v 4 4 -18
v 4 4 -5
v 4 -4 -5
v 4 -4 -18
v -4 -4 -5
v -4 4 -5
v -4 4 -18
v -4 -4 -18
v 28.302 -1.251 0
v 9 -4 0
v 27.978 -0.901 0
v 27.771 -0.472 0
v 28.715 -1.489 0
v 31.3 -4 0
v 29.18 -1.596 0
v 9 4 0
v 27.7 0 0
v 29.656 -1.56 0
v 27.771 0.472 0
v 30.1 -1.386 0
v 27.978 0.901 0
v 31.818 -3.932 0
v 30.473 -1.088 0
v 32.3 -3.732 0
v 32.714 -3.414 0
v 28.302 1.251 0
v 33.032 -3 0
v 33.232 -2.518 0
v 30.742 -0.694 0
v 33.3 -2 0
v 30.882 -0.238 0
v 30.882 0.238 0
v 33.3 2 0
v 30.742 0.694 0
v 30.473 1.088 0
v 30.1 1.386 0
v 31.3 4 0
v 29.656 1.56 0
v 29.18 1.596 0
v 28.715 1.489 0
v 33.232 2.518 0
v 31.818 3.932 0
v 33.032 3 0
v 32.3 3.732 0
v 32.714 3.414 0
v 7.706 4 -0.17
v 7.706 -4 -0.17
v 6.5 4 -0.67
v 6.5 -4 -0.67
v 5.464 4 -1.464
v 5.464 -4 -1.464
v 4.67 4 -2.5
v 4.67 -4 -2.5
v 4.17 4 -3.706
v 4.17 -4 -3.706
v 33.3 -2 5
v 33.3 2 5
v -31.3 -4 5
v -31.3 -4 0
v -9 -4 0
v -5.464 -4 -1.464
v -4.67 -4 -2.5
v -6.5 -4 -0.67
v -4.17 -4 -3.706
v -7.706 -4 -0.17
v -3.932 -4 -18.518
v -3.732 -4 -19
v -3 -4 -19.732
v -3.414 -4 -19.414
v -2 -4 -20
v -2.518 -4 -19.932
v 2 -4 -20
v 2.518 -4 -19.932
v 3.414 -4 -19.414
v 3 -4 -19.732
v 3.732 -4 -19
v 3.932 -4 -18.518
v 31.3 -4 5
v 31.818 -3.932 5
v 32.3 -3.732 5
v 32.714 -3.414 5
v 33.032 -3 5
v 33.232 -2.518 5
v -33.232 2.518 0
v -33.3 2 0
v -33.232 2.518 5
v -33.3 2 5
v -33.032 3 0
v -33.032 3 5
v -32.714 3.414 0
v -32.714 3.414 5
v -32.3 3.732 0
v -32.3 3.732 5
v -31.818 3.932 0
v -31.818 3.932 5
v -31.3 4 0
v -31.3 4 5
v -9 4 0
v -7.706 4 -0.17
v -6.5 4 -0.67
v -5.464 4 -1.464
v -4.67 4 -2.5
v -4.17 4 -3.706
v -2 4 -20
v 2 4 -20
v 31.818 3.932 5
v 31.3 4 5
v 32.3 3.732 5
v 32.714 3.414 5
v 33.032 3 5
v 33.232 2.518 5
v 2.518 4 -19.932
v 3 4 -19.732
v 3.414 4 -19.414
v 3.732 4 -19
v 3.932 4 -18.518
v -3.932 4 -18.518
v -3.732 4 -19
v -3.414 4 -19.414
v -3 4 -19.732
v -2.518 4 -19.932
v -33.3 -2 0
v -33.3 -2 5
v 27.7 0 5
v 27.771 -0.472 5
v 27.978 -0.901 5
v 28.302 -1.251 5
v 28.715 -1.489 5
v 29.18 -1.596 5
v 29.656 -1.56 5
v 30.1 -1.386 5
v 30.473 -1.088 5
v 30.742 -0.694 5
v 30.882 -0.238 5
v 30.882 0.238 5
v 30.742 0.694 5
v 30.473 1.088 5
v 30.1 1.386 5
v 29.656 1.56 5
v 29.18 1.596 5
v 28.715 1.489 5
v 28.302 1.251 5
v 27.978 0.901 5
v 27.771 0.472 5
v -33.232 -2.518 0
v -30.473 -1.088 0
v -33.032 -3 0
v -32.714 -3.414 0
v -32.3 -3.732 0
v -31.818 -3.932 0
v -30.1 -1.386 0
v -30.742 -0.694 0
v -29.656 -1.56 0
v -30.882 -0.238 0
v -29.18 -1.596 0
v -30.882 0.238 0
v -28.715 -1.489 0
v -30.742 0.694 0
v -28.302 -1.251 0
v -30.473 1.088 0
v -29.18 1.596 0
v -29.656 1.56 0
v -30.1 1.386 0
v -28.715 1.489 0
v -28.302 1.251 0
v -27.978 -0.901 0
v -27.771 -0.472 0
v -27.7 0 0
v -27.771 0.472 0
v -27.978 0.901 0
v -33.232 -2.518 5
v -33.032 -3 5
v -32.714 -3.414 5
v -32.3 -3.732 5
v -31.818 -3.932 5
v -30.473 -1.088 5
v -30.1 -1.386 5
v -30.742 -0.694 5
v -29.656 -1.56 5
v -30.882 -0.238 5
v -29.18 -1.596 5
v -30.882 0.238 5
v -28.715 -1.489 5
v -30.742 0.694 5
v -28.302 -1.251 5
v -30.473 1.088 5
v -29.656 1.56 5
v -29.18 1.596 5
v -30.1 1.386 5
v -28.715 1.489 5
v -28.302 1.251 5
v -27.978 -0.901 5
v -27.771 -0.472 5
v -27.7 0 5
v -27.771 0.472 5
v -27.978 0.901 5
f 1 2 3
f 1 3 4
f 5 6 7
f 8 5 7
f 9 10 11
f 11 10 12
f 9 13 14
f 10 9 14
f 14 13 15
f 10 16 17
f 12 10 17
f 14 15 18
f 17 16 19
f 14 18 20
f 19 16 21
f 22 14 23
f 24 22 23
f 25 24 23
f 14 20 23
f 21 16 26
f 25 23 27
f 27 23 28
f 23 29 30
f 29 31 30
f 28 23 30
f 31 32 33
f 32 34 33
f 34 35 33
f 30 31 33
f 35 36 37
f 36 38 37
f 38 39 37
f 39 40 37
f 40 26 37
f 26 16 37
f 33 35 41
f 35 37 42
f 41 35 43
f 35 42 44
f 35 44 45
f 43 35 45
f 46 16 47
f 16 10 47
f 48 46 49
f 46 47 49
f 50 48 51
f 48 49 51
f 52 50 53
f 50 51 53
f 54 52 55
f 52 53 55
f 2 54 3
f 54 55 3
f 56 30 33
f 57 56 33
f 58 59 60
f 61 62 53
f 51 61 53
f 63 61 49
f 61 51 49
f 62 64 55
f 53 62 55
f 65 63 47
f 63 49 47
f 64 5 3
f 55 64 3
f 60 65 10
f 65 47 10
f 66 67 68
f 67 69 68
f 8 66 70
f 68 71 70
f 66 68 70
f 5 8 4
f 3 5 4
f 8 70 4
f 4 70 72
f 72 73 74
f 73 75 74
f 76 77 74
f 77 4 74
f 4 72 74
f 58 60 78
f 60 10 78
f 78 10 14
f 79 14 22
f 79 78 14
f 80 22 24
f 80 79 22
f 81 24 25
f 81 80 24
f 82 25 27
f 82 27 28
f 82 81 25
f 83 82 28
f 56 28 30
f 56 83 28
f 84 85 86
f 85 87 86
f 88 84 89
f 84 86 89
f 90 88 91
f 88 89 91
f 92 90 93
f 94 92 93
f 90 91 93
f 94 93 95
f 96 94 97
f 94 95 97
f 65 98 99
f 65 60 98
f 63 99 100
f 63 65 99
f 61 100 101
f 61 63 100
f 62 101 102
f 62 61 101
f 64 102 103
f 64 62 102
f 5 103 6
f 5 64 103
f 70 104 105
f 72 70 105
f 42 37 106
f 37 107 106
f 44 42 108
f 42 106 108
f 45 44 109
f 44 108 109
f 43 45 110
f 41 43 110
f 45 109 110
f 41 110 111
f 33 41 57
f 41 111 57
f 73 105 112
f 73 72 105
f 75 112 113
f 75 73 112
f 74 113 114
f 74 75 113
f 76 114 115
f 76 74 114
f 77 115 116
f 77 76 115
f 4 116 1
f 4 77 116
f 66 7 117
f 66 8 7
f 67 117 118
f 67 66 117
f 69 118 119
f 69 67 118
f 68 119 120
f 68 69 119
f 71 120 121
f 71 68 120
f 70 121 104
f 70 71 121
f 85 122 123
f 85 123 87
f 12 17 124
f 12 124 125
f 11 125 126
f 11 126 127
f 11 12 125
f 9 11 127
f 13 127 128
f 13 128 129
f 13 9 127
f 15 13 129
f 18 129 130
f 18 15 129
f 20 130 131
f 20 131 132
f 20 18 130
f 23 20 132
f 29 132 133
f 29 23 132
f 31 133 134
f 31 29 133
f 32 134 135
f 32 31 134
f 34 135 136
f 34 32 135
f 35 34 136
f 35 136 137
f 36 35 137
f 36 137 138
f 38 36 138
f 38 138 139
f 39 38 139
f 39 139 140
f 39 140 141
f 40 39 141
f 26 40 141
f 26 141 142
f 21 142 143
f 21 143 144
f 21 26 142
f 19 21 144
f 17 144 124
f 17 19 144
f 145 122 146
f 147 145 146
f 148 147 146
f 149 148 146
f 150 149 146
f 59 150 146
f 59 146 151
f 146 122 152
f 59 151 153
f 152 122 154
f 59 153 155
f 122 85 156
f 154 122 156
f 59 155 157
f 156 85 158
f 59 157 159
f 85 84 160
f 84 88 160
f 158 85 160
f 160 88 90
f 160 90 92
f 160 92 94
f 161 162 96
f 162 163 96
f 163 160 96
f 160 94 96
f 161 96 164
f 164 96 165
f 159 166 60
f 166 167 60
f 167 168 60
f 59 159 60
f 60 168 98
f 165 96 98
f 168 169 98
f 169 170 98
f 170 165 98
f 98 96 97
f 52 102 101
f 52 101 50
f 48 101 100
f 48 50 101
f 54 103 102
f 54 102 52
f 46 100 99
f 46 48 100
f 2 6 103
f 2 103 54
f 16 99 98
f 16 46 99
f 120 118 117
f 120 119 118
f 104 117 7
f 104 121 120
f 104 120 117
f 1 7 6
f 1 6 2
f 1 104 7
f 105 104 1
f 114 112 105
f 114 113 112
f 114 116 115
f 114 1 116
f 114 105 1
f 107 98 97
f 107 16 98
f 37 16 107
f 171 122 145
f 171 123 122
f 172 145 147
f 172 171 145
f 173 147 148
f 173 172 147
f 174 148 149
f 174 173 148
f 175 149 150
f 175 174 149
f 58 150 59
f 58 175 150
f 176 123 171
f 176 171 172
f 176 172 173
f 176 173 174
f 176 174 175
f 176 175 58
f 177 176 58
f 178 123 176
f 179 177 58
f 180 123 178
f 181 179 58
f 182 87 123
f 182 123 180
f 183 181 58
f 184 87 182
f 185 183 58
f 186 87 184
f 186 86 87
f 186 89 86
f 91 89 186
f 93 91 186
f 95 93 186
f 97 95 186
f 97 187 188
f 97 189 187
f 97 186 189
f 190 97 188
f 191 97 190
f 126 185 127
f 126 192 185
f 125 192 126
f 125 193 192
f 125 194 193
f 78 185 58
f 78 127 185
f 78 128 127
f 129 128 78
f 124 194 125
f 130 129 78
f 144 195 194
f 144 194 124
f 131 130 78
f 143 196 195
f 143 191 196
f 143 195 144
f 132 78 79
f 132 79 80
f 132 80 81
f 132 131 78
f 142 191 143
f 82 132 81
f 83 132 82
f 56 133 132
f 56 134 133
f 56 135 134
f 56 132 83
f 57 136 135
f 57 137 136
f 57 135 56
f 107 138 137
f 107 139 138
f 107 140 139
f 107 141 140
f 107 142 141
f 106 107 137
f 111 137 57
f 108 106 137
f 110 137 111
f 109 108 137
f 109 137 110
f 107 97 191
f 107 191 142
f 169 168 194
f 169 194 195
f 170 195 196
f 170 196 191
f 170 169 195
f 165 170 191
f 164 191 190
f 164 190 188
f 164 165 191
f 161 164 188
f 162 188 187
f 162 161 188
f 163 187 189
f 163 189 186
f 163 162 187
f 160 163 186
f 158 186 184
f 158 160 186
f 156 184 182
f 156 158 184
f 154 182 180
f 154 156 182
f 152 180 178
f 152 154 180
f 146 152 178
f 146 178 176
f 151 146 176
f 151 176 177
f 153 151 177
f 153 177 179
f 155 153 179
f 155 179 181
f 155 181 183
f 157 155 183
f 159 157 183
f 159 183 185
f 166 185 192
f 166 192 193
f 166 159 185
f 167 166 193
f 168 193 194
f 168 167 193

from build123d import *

# Parameters (mm, degrees)
SKETCH_1_W      = 66.6
SKETCH_1_H      = 8
SKETCH_1_R      = 1.6
EXTRUDE_1_DEPTH = 5
SKETCH_2_W      = 8
SKETCH_2_H      = 20
EXTRUDE_2_DEPTH = 8
FILLET_1_R      = 2
FILLET_2_R      = 5
FILLET_3_R      = 2


with BuildPart() as part:
    # 草图1 → 凸台-拉伸1 (new body)
    with BuildSketch(Plane.XY):
        Rectangle(SKETCH_1_W, SKETCH_1_H)
        with Locations((-29.3, 0)):
            Circle(SKETCH_1_R, mode=Mode.SUBTRACT)
        with Locations(Location((29.3, 0, 0), (0, 0, 180))):
            Circle(SKETCH_1_R, mode=Mode.SUBTRACT)
    extrude(amount=EXTRUDE_1_DEPTH)

    # 草图2 → 凸台-拉伸2 (add)
    with BuildSketch(Plane(origin=(0, 4, 0), x_dir=(1, 0, 0), z_dir=(0, 1, 0))):
        with Locations((0, 10)):
            Rectangle(SKETCH_2_W, SKETCH_2_H)
    extrude(amount=-EXTRUDE_2_DEPTH)

    # 圆角1
    fillet_1_edges = [part.edges().sort_by_distance(p)[0] for p in [
        (-33.3, 4, 2.5),
        (33.3, 4, 2.5),
        (33.3, -4, 2.5),
        (-33.3, -4, 2.5),
    ]]
    fillet(fillet_1_edges, radius=FILLET_1_R)

    # 圆角2
    fillet_2_edges = [part.edges().sort_by_distance(p)[0] for p in [
        (4, 0, 0),
        (-4, 0, 0),
    ]]
    fillet(fillet_2_edges, radius=FILLET_2_R)

    # 圆角3
    fillet_3_edges = [part.edges().sort_by_distance(p)[0] for p in [
        (-4, 0, -20),
        (4, 0, -20),
    ]]
    fillet(fillet_3_edges, radius=FILLET_3_R)


solid = part.part
